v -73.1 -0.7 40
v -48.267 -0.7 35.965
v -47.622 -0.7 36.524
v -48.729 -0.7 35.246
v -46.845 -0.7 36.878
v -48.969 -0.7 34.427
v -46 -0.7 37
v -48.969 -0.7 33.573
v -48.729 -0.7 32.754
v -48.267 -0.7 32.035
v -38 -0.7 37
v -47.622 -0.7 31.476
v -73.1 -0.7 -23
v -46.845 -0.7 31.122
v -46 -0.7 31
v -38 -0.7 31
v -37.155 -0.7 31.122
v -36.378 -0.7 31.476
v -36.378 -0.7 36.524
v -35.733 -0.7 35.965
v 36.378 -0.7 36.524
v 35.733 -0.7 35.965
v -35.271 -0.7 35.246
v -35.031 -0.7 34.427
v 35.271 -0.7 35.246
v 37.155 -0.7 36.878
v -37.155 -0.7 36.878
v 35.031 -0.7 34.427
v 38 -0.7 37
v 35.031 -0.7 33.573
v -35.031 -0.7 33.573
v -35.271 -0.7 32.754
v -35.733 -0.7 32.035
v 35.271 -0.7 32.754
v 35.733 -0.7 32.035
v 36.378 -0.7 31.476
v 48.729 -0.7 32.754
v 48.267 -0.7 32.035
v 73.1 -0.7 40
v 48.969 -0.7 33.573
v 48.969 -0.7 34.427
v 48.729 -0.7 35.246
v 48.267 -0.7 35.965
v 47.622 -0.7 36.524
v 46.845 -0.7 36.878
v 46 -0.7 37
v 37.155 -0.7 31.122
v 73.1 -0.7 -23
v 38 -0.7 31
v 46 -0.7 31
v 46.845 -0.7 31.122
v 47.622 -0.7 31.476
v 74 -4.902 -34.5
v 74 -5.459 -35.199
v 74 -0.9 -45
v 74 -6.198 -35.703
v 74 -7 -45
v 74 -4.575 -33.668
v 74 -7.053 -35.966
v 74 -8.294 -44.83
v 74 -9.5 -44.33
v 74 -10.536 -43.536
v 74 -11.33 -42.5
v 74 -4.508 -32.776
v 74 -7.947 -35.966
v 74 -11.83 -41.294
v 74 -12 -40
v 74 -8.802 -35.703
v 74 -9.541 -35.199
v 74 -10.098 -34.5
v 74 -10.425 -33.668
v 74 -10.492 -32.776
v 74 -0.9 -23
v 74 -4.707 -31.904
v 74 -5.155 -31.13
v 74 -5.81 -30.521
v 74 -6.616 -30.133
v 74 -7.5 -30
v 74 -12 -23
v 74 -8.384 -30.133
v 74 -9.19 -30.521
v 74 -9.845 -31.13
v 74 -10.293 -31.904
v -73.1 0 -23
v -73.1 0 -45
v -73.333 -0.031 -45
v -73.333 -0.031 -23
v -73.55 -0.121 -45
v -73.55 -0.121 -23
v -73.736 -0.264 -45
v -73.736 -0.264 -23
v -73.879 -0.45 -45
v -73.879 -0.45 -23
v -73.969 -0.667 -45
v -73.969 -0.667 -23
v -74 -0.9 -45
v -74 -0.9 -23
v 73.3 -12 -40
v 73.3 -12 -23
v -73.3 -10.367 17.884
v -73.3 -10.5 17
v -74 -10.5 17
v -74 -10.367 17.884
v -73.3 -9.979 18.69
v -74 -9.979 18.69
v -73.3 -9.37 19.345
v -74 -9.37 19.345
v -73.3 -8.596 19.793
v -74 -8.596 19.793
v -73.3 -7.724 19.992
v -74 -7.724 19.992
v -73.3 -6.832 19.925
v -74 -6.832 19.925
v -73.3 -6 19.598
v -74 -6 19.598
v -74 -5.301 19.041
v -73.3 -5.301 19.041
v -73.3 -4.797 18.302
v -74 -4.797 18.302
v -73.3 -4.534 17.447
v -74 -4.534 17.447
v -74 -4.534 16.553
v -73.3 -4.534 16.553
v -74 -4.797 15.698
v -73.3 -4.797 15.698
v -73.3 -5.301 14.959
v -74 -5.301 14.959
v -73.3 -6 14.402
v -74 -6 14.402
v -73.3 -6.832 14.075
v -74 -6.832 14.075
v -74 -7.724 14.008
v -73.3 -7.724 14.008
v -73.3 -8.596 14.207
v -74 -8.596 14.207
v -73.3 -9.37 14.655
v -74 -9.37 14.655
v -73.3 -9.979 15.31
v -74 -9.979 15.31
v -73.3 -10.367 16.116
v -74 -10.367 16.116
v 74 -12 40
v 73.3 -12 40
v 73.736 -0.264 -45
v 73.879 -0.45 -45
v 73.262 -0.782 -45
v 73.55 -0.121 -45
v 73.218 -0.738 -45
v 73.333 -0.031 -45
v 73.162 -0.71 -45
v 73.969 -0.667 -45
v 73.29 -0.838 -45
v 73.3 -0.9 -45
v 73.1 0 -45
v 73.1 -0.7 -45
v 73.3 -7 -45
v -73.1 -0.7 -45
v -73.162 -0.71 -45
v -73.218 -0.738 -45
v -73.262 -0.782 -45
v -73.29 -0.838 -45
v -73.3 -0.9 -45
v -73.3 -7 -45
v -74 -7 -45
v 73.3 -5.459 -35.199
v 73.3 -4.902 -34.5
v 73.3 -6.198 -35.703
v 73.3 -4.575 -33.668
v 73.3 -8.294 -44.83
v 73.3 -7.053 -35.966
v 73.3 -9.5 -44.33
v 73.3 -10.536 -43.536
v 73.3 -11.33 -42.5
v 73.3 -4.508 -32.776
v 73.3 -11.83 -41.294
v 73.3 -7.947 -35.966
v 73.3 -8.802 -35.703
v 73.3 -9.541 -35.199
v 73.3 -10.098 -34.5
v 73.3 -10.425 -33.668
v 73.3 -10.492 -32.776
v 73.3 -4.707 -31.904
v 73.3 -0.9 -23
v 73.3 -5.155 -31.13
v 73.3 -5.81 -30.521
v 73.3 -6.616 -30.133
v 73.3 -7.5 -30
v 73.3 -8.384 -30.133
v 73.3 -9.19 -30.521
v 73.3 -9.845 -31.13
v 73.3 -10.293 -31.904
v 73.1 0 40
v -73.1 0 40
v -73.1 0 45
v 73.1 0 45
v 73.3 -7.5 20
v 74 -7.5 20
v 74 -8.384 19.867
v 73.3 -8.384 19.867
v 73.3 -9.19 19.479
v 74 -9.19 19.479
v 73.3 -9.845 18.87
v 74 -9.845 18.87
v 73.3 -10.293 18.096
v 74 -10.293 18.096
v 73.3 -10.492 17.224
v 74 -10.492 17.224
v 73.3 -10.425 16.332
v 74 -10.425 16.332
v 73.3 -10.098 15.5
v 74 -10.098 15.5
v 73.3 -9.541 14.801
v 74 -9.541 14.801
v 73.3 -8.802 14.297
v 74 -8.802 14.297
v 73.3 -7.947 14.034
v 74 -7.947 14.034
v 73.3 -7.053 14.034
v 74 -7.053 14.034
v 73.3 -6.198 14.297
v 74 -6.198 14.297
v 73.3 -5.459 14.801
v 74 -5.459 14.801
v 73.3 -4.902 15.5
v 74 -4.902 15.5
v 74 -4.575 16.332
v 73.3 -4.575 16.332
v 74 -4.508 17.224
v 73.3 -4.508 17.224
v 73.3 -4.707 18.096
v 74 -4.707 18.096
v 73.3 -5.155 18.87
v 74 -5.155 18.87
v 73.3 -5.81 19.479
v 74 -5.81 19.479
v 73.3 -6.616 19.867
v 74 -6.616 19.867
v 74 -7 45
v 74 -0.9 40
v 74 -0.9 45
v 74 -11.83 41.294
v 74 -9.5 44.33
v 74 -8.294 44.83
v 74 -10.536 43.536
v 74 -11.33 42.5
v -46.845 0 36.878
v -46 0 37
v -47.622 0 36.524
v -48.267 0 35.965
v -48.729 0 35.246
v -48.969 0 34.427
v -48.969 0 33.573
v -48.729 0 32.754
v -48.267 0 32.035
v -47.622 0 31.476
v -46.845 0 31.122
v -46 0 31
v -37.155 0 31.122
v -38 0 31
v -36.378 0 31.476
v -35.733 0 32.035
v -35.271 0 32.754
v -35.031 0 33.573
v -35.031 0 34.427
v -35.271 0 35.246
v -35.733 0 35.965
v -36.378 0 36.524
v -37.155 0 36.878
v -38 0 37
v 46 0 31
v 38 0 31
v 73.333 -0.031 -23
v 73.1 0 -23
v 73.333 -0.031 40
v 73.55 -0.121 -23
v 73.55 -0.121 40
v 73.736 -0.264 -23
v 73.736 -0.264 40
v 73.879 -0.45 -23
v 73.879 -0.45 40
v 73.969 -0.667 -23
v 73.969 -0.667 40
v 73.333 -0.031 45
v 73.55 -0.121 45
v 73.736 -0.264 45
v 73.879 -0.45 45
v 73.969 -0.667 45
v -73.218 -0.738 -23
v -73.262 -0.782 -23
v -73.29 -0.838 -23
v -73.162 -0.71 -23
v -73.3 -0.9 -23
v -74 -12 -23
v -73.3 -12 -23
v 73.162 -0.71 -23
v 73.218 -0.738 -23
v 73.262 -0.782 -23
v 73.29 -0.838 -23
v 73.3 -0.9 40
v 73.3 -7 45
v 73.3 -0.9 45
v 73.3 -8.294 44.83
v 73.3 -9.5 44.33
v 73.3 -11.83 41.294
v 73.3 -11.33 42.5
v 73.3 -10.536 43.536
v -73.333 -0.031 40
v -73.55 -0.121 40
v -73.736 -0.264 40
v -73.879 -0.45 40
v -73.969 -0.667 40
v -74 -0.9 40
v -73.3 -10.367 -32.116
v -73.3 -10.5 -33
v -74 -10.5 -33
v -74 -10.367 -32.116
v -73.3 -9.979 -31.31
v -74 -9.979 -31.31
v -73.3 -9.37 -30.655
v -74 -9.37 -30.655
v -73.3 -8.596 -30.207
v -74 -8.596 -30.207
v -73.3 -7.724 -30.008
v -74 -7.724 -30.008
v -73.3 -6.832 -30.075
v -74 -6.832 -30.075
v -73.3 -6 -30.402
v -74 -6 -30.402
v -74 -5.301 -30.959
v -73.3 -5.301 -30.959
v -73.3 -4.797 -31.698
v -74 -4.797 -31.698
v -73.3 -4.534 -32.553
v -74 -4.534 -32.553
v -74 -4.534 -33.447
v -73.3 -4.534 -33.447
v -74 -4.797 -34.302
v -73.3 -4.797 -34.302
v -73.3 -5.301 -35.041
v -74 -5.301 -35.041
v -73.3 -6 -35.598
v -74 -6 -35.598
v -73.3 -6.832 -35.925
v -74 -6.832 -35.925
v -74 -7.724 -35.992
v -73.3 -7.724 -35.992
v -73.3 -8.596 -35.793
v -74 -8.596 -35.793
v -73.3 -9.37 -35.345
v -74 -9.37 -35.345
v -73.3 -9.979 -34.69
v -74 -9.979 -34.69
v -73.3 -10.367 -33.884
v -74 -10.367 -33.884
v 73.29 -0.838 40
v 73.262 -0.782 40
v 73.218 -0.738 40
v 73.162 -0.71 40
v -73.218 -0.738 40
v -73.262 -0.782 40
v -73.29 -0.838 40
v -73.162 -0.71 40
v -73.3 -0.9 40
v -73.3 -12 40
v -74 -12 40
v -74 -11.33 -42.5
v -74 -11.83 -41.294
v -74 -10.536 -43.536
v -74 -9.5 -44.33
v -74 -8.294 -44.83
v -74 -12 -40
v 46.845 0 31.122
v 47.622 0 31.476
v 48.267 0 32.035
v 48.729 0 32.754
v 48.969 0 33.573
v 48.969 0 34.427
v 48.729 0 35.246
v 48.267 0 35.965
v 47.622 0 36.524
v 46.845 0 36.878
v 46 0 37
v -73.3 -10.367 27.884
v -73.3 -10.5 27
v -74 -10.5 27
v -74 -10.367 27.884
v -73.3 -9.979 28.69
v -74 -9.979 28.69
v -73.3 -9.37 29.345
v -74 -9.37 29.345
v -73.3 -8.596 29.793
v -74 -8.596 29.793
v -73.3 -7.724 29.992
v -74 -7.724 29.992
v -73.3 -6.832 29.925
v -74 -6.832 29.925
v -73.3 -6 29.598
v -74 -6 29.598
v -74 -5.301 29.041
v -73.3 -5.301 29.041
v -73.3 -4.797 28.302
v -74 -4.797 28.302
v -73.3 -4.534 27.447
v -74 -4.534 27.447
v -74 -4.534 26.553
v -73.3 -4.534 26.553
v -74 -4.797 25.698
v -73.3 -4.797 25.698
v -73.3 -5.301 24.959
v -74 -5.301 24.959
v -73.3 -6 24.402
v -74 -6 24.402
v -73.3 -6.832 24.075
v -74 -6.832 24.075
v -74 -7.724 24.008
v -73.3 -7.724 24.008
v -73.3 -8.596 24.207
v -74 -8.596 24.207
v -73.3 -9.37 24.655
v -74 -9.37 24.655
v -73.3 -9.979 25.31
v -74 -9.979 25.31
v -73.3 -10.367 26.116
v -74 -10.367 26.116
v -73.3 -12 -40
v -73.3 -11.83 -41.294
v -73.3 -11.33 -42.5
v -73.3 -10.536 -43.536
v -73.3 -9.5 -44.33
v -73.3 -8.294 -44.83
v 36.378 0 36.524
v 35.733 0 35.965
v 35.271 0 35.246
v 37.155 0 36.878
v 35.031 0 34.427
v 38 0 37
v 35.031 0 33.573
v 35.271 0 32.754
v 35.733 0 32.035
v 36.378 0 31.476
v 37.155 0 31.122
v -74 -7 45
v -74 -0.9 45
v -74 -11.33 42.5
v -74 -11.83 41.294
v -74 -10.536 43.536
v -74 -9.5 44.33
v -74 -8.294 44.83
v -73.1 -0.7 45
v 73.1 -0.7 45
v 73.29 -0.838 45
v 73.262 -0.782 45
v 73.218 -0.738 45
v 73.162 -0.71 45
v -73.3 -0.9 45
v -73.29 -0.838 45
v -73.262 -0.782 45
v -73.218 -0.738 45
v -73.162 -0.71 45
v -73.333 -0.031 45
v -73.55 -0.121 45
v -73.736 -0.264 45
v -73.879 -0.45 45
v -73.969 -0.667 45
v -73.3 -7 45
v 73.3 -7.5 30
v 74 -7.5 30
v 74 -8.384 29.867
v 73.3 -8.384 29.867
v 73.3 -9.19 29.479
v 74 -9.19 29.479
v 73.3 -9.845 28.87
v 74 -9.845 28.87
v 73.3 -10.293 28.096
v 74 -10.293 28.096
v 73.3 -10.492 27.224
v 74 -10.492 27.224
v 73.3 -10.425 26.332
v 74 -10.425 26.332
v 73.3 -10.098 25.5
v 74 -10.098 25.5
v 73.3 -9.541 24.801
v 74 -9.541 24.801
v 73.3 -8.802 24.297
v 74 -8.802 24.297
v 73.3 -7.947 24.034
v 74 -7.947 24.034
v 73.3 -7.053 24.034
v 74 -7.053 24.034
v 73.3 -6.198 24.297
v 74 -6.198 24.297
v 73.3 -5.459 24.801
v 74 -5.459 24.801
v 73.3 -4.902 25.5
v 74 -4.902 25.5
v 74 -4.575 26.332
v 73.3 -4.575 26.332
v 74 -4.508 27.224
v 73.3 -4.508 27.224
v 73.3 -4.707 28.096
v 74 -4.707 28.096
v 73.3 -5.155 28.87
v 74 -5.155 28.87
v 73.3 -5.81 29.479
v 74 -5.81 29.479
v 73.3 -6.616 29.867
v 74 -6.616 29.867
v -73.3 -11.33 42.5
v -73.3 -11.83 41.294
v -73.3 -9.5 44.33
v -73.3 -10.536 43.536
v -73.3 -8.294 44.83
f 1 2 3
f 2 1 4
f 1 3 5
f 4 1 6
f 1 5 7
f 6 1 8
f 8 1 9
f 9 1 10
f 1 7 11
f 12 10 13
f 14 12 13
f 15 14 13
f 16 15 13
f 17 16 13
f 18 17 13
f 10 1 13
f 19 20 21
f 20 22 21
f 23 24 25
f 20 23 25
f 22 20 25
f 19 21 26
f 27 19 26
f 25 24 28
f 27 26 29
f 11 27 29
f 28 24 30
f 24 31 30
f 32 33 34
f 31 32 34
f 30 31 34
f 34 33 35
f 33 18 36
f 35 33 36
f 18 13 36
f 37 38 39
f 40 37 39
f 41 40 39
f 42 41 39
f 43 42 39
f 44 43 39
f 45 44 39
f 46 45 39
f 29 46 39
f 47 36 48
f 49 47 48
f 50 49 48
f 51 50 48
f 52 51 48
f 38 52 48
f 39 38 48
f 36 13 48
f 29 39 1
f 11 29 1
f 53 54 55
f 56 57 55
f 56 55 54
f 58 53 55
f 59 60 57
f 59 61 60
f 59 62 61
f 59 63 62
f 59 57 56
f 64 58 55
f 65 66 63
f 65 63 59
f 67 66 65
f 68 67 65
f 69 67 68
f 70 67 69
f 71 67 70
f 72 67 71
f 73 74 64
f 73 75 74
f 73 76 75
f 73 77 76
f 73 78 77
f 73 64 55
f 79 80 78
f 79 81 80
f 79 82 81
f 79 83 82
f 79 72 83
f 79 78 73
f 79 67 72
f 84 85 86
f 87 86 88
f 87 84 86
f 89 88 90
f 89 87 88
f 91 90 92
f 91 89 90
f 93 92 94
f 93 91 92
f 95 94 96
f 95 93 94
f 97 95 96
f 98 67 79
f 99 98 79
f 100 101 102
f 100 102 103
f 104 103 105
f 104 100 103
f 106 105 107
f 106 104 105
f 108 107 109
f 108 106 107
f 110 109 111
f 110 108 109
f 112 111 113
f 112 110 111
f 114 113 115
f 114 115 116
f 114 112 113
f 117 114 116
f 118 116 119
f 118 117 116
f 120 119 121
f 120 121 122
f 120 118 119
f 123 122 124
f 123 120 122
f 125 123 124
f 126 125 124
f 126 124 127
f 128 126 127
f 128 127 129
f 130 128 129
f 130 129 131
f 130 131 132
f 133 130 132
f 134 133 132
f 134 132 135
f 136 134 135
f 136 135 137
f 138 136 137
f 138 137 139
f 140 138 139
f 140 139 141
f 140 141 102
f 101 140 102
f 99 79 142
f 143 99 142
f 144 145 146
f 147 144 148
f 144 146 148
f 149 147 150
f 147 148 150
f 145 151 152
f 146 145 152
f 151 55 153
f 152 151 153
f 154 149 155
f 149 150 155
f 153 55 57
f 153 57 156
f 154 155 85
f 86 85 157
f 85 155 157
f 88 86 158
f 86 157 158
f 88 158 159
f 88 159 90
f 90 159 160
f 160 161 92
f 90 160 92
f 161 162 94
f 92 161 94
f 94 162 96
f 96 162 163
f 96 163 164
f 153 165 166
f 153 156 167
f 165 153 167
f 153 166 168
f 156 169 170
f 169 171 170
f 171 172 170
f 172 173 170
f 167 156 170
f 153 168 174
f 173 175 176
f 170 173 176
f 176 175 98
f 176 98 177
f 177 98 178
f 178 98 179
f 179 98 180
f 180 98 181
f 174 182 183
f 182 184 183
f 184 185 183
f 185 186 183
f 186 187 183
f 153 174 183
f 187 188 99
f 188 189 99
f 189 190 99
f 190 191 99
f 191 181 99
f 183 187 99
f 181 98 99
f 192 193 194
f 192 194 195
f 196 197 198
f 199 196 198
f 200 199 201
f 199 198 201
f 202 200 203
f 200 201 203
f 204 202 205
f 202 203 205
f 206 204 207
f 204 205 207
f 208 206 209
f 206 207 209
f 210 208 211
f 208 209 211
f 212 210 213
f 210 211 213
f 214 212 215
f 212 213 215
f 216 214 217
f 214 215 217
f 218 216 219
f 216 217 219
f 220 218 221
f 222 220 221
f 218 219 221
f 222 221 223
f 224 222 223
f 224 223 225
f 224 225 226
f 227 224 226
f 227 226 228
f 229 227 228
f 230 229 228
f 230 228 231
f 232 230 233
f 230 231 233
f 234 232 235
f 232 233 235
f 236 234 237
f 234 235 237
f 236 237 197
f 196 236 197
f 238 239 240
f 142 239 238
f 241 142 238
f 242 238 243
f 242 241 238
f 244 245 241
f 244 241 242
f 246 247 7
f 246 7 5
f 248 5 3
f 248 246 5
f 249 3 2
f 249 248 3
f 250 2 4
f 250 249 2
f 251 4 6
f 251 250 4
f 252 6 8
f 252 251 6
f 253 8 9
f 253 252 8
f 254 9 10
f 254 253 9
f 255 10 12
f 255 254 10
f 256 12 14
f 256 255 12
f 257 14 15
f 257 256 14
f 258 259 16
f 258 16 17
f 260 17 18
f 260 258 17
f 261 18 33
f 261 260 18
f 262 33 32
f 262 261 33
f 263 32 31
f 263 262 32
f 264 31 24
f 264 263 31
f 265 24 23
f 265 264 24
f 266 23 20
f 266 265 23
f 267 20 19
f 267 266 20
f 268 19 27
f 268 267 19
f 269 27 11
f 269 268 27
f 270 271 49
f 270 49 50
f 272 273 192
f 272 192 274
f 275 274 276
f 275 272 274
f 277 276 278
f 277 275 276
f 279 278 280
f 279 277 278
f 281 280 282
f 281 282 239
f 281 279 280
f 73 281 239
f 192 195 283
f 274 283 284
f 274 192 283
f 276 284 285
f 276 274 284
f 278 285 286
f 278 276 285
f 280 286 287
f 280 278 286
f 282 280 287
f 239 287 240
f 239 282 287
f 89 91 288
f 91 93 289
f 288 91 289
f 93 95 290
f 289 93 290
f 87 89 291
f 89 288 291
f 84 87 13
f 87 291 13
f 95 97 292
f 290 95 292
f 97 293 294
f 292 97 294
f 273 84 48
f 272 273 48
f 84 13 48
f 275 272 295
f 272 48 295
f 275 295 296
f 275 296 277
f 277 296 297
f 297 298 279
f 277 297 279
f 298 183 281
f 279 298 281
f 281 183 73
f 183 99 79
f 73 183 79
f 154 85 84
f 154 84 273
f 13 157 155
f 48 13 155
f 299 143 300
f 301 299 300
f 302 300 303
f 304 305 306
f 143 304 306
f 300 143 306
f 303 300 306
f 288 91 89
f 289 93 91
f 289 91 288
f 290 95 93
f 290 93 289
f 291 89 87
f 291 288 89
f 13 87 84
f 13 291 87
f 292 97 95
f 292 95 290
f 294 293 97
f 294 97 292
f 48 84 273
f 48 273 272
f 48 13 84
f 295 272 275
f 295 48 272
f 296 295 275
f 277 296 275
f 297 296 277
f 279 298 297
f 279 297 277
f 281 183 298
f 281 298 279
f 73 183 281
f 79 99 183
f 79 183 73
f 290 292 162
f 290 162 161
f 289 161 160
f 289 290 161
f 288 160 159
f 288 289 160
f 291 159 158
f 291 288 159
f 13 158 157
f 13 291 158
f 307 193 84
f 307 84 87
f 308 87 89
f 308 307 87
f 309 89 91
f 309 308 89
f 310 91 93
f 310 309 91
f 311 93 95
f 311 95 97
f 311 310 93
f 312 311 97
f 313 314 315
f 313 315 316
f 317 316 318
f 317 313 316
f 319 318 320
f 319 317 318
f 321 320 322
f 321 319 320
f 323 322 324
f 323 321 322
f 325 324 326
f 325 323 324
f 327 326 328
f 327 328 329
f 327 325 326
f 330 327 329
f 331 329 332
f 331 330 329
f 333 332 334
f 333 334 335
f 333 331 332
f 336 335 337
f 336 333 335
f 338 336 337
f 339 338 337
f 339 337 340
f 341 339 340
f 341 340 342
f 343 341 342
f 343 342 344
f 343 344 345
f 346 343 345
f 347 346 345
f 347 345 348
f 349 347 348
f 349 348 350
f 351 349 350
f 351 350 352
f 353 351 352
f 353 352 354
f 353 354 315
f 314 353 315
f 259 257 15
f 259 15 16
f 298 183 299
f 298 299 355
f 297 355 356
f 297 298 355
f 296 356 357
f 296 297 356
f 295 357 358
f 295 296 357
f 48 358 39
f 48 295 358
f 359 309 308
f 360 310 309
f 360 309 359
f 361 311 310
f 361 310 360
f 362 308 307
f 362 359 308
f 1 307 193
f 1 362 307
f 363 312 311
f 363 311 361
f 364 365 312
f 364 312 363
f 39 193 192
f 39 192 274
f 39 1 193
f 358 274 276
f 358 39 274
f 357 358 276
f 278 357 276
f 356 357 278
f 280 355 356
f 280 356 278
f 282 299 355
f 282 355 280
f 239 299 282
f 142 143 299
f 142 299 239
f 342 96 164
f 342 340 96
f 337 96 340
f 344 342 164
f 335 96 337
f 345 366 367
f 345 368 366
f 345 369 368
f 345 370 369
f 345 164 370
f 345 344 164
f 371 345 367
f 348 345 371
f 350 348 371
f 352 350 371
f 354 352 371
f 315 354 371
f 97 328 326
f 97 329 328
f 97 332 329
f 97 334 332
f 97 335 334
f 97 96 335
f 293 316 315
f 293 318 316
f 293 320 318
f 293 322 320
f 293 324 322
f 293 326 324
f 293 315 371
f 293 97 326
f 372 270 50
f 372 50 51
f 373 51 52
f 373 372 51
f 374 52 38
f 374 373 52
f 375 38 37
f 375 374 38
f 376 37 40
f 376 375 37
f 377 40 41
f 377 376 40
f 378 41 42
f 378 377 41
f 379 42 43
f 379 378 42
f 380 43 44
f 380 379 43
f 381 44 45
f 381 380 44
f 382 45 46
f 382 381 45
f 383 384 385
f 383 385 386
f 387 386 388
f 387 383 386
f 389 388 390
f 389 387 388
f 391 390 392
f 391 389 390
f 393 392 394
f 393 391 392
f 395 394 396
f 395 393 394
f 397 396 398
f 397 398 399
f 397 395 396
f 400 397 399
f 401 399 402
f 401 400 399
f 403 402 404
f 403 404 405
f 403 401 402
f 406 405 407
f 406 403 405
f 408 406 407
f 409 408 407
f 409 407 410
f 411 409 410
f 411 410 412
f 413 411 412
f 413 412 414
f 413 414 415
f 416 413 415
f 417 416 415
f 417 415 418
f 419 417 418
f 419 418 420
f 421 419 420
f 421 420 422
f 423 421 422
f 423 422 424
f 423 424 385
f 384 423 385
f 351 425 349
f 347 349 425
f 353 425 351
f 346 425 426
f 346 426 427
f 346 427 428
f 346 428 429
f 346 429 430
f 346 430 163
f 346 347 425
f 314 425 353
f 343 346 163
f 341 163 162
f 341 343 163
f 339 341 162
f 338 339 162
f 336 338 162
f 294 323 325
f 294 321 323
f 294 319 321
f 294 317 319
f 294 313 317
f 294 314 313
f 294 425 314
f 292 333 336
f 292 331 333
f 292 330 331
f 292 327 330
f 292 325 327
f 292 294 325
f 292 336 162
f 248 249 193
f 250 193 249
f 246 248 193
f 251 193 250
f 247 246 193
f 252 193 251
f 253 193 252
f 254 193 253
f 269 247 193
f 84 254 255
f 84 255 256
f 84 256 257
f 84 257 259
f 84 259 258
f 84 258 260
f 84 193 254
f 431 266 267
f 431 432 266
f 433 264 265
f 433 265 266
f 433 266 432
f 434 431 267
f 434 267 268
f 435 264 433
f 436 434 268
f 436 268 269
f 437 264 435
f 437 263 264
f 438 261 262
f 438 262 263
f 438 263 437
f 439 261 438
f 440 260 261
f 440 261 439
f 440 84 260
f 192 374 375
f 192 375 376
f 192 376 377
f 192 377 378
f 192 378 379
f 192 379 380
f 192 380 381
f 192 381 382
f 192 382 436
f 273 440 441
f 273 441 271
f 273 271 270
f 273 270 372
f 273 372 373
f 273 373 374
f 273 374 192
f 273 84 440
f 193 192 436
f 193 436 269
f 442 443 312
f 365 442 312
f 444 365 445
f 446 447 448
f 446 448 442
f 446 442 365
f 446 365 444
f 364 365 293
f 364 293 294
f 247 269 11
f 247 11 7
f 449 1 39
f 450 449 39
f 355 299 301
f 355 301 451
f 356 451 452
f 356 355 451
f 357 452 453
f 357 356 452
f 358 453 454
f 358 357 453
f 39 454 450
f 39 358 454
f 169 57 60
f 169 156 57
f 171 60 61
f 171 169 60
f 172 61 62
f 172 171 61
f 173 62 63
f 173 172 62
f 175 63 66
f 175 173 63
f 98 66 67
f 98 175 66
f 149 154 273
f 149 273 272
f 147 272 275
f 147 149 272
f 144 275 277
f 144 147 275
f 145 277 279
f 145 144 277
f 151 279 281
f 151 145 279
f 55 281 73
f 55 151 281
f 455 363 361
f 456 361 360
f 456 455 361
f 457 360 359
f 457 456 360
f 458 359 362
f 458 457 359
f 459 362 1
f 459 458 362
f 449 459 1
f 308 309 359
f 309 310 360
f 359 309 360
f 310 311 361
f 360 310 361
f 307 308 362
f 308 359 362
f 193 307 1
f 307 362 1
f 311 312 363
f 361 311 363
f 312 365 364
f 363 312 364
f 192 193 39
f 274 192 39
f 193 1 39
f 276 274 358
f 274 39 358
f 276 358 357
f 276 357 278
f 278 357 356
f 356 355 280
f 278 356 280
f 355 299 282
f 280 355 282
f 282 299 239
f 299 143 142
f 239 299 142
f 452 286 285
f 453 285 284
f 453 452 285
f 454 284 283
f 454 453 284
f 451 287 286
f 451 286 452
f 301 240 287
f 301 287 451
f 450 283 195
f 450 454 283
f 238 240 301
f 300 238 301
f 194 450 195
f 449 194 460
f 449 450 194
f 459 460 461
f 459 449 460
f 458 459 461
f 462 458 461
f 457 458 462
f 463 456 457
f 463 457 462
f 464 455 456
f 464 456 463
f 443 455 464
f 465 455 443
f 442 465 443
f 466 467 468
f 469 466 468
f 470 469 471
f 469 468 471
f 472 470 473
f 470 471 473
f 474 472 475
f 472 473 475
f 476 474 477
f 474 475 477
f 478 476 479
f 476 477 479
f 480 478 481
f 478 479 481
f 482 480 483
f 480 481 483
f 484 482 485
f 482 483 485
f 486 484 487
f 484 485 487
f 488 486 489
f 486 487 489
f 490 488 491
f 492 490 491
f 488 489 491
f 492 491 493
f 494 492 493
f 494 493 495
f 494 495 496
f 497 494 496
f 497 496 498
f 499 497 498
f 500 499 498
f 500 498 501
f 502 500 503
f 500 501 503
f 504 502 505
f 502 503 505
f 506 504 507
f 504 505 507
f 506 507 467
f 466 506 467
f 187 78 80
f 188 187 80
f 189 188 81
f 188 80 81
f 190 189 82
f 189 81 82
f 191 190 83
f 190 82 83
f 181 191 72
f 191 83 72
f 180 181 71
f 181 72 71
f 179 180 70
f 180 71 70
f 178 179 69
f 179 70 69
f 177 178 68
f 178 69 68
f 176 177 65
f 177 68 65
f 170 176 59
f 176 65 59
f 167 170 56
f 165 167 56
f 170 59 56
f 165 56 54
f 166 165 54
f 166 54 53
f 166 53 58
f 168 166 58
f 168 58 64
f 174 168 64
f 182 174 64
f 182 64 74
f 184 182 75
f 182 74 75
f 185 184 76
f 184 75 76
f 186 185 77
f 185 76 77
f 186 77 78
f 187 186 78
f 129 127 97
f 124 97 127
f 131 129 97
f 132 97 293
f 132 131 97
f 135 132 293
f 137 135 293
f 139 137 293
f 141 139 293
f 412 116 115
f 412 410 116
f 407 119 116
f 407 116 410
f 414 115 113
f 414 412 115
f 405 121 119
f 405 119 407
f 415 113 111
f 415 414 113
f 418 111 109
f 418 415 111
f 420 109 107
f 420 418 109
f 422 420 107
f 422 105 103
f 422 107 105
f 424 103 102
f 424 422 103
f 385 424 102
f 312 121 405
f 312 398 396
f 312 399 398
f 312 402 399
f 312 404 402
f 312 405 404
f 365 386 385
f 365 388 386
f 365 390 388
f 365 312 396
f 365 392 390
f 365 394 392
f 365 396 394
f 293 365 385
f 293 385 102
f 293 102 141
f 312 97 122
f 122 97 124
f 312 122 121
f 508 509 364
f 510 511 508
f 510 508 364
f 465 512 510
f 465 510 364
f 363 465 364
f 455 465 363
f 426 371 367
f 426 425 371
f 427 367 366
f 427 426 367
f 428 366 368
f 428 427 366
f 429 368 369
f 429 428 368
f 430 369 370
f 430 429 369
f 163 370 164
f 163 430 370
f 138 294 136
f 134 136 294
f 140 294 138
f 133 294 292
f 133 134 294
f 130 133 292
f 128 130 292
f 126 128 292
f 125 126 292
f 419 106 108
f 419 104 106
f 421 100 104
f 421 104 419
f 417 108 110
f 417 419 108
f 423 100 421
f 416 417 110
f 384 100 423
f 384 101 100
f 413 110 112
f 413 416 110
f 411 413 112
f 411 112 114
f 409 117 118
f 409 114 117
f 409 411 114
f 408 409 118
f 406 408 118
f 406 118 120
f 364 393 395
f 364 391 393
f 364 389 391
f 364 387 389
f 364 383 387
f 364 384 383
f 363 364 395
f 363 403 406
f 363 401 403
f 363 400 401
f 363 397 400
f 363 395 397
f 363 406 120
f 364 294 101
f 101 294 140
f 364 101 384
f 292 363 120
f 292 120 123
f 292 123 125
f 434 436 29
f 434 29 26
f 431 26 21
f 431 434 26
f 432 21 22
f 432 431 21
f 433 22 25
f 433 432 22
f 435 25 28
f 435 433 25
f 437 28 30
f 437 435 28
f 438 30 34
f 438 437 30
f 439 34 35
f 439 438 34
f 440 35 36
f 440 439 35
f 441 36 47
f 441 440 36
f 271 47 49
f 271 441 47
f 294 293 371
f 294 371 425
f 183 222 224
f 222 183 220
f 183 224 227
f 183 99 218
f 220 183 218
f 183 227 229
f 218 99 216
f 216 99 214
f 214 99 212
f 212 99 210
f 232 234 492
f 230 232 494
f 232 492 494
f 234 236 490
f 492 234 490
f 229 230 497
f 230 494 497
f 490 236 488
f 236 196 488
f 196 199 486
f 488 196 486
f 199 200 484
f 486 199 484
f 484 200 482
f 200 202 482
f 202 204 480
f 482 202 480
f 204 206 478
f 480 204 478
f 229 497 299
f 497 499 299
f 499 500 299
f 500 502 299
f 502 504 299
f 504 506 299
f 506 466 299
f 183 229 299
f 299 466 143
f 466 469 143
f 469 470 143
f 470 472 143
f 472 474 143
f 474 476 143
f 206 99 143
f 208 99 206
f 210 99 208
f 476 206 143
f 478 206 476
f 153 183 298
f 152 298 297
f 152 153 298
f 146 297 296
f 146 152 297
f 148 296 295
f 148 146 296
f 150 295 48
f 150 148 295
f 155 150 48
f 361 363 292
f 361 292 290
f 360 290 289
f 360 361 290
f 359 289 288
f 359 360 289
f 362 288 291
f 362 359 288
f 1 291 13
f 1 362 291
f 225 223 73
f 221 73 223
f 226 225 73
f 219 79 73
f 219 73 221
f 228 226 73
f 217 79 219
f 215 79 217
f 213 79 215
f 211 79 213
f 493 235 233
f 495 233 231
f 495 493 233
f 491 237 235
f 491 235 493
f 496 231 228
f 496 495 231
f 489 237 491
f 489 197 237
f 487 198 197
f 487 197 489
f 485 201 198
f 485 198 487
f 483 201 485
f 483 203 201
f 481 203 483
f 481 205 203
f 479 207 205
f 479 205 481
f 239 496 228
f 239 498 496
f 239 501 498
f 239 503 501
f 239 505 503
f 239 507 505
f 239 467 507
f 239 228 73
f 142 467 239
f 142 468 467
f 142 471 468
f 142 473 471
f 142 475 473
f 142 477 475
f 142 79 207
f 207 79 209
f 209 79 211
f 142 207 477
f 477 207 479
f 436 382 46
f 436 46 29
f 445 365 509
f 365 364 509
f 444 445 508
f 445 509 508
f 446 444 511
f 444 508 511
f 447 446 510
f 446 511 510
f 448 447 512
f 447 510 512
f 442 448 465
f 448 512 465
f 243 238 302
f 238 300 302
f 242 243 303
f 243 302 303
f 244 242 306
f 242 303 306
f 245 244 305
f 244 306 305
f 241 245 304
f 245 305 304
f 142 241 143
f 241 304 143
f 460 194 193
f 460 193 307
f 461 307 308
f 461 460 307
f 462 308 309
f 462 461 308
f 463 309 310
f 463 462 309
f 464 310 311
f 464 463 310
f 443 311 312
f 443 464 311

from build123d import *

# Parameters (mm, degrees)
SKETCH_1_W                         = 148
SKETCH_1_H                         = 90
SM_BASE_FLANGE_1_DEPTH             = 0.7
SM_EDGE_FLANGE_1_STRIP_W           = 3.2
SM_EDGE_FLANGE_1_STRIP_H           = 0.7
SM_EDGE_FLANGE_1_STRIP_CUT_DEPTH   = 90
SM_EDGE_FLANGE_1_STRIP_2_W         = 3.2
SM_EDGE_FLANGE_1_STRIP_2_H         = 0.7
SM_EDGE_FLANGE_1_STRIP_CUT_2_DEPTH = 90
SM_EDGE_FLANGE_1_DEPTH             = 90
SM_EDGE_FLANGE_1_PROFILE_W         = 90
SM_EDGE_FLANGE_1_PROFILE_H         = 11.1
SM_EDGE_FLANGE_1_PROFILE_R         = 3
SM_EDGE_FLANGE_1_FLAT_DEPTH        = 0.7
SM_EDGE_FLANGE_1_BEND_DEPTH        = 90
FILLET_2_R                         = 5
CUT_EXTRUDE_START                  = -10
SKETCH_15_R                        = 3
CUT_EXTRUDE_1_DEPTH                = 10
SPLIT_BODIES_1_SURFACE_1_1_BACK    = 174.632
SPLIT_BODIES_1_SURFACE_1_1_DEPTH   = 349.264
SPLIT_BODIES_1_SURFACE_1_2_BACK    = 174.632
SPLIT_BODIES_1_SURFACE_1_2_DEPTH   = 349.264
SPLIT_BODIES_1_SURFACE_2_3_BACK    = 174.632
SPLIT_BODIES_1_SURFACE_2_3_DEPTH   = 349.264
SPLIT_BODIES_1_SURFACE_2_4_BACK    = 174.632
SPLIT_BODIES_1_SURFACE_2_4_DEPTH   = 349.264


# Sheet-metal steps are written as plain solids
with BuildPart() as part:
    # Sketch 1 → 基体-法兰1 (new body)
    with BuildSketch(Plane(origin=(0, 0, 0), x_dir=(1, 0, 0), z_dir=(0, 1, 0))):
        Rectangle(SKETCH_1_W, SKETCH_1_H)
        with BuildLine():
            Line((-46, -31), (-38, -31))
            ThreePointArc((-38, -31), (-35, -34), (-38, -37))
            Line((-38, -37), (-46, -37))
            ThreePointArc((-46, -37), (-49, -34), (-46, -31))
        make_face(mode=Mode.SUBTRACT)
        with BuildLine():
            Line((38, -31), (46, -31))
            ThreePointArc((46, -31), (49, -34), (46, -37))
            Line((46, -37), (38, -37))
            ThreePointArc((38, -37), (35, -34), (38, -31))
        make_face(mode=Mode.SUBTRACT)
    extrude(amount=-SM_BASE_FLANGE_1_DEPTH)

    # 边线-法兰1 strip (across the edge) → 边线-法兰1 strip cut (cut)
    with BuildSketch(Plane(origin=(74, -0.7, -45), x_dir=(-1, 0, 0), z_dir=(0, 0, 1))):
        with Locations((-0.7, -0.35)):
            Rectangle(SM_EDGE_FLANGE_1_STRIP_W, SM_EDGE_FLANGE_1_STRIP_H)
    extrude(amount=SM_EDGE_FLANGE_1_STRIP_CUT_DEPTH, mode=Mode.SUBTRACT)

    # 边线-法兰1 strip 2 (across the edge) → 边线-法兰1 strip cut 2 (cut)
    with BuildSketch(Plane(origin=(-74, -0.7, 45), x_dir=(1, 0, 0), z_dir=(0, 0, -1))):
        with Locations((-0.7, -0.35)):
            Rectangle(SM_EDGE_FLANGE_1_STRIP_2_W, SM_EDGE_FLANGE_1_STRIP_2_H)
    extrude(amount=SM_EDGE_FLANGE_1_STRIP_CUT_2_DEPTH, mode=Mode.SUBTRACT)

    # 边线-法兰1 bend section (across the edge) → 边线-法兰1 (add)
    with BuildSketch(Plane(origin=(74, -0.7, -45), x_dir=(-1, 0, 0), z_dir=(0, 0, 1))):
        with BuildLine():
            Line((0, 0.2), (0.7, 0.2))
            ThreePointArc((0.7, 0.2), (0.758578644, 0.058578644), (0.9, 0))
            Line((0.9, 0), (0.9, -0.7))
            ThreePointArc((0.9, -0.7), (0.263603897, -0.436396103), (0, 0.2))
        make_face()
    extrude(amount=SM_EDGE_FLANGE_1_DEPTH)

    # 边线-法兰1 profile (on flange) → 边线-法兰1 flat (add)
    with BuildSketch(Plane(origin=(74, -0.7, 0), x_dir=(0, 0, 1), z_dir=(1, 0, 0))):
        with Locations((0, 5.75)):
            Rectangle(SM_EDGE_FLANGE_1_PROFILE_W, SM_EDGE_FLANGE_1_PROFILE_H)
        with Locations((17, 6.8)):
            Circle(SM_EDGE_FLANGE_1_PROFILE_R, mode=Mode.SUBTRACT)
        with Locations((27, 6.8)):
            Circle(SM_EDGE_FLANGE_1_PROFILE_R, mode=Mode.SUBTRACT)
        with Locations((-33, 6.8)):
            Circle(SM_EDGE_FLANGE_1_PROFILE_R, mode=Mode.SUBTRACT)
    extrude(amount=-SM_EDGE_FLANGE_1_FLAT_DEPTH)

    # 边线-法兰1 section (across the edge) → 边线-法兰1 bend (add)
    with BuildSketch(Plane(origin=(-74, -0.7, 45), x_dir=(1, 0, 0), z_dir=(0, 0, -1))):
        with BuildLine():
            Line((0, 0.2), (0, 11.3))
            Line((0, 11.3), (0.7, 11.3))
            Line((0.7, 11.3), (0.7, 0.2))
            ThreePointArc((0.7, 0.2), (0.758578644, 0.058578644), (0.9, 0))
            Line((0.9, 0), (0.9, -0.7))
            ThreePointArc((0.9, -0.7), (0.263603897, -0.436396103), (0, 0.2))
        make_face()
    extrude(amount=SM_EDGE_FLANGE_1_BEND_DEPTH)

    # 圆角2
    fillet_2_edges = [part.edges().sort_by_distance(p)[0] for p in [
        (-73.65, -12, 45),
        (-73.65, -12, -45),
        (73.65, -12, -45),
        (73.65, -12, 45),
    ]]
    fillet(fillet_2_edges, radius=FILLET_2_R)

    # 草图15 → 切除-拉伸1 (cut)
    with BuildSketch(Plane.ZY.offset(74).offset(CUT_EXTRUDE_START)):
        with Locations(Location((-33, -7.5, 0), (0, 0, 270))):
            Circle(SKETCH_15_R)
        with Locations(Location((17, -7.5, 0), (0, 0, 270))):
            Circle(SKETCH_15_R)
        with Locations(Location((27, -7.5, 0), (0, 0, 270))):
            Circle(SKETCH_15_R)
    extrude(amount=CUT_EXTRUDE_1_DEPTH, mode=Mode.SUBTRACT)


with BuildPart() as body_2:
    # Split Bodies 1: the piece behind the surface
    add(part.part)
    # Split Bodies 1 surface 1: a surface, the sketch's curves swept straight by 349.264 mm
    with BuildLine(Plane(origin=(0, 0, 0), x_dir=(1, 0, 0), z_dir=(0, 1, 0)).offset(-SPLIT_BODIES_1_SURFACE_1_1_BACK), mode=Mode.PRIVATE) as split_bodies_1_surface_1_1_path:
        Line((-74, 23), (74, 23))
    split_bodies_1_surface_1_1 = Shell.extrude(split_bodies_1_surface_1_1_path.wire(), (0 * SPLIT_BODIES_1_SURFACE_1_1_DEPTH, 1 * SPLIT_BODIES_1_SURFACE_1_1_DEPTH, 0 * SPLIT_BODIES_1_SURFACE_1_1_DEPTH))
    split(bisect_by=split_bodies_1_surface_1_1, keep=Keep.BOTTOM)


with BuildPart() as part_1:
    add(part.part)

    # Split Bodies 1: split by a surface, the side it looks to stays
    # Split Bodies 1 surface 1: a surface, the sketch's curves swept straight by 349.264 mm
    with BuildLine(Plane(origin=(0, 0, 0), x_dir=(1, 0, 0), z_dir=(0, 1, 0)).offset(-SPLIT_BODIES_1_SURFACE_1_2_BACK), mode=Mode.PRIVATE) as split_bodies_1_surface_1_2_path:
        Line((-74, 23), (74, 23))
    split_bodies_1_surface_1_2 = Shell.extrude(split_bodies_1_surface_1_2_path.wire(), (0 * SPLIT_BODIES_1_SURFACE_1_2_DEPTH, 1 * SPLIT_BODIES_1_SURFACE_1_2_DEPTH, 0 * SPLIT_BODIES_1_SURFACE_1_2_DEPTH))
    split(bisect_by=split_bodies_1_surface_1_2, keep=Keep.TOP)


with BuildPart() as body_3:
    # Split Bodies 1 2 body 2: the piece behind the surface
    add(body_2.part)
    # Split Bodies 1 surface 2: a surface, the sketch's curves swept straight by 349.264 mm
    with BuildLine(Plane(origin=(0, 0, 0), x_dir=(1, 0, 0), z_dir=(0, 1, 0)).offset(-SPLIT_BODIES_1_SURFACE_2_3_BACK), mode=Mode.PRIVATE) as split_bodies_1_surface_2_3_path:
        Line((-74, -40), (74, -40))
    split_bodies_1_surface_2_3 = Shell.extrude(split_bodies_1_surface_2_3_path.wire(), (0 * SPLIT_BODIES_1_SURFACE_2_3_DEPTH, 1 * SPLIT_BODIES_1_SURFACE_2_3_DEPTH, 0 * SPLIT_BODIES_1_SURFACE_2_3_DEPTH))
    split(bisect_by=split_bodies_1_surface_2_3, keep=Keep.BOTTOM)


with BuildPart() as body_2_1:
    add(body_2.part)

    # Split Bodies 1 2 body 2: split by a surface, the side it looks to stays
    # Split Bodies 1 surface 2: a surface, the sketch's curves swept straight by 349.264 mm
    with BuildLine(Plane(origin=(0, 0, 0), x_dir=(1, 0, 0), z_dir=(0, 1, 0)).offset(-SPLIT_BODIES_1_SURFACE_2_4_BACK), mode=Mode.PRIVATE) as split_bodies_1_surface_2_4_path:
        Line((-74, -40), (74, -40))
    split_bodies_1_surface_2_4 = Shell.extrude(split_bodies_1_surface_2_4_path.wire(), (0 * SPLIT_BODIES_1_SURFACE_2_4_DEPTH, 1 * SPLIT_BODIES_1_SURFACE_2_4_DEPTH, 0 * SPLIT_BODIES_1_SURFACE_2_4_DEPTH))
    split(bisect_by=split_bodies_1_surface_2_4, keep=Keep.TOP)


solid = Compound([part_1.part, body_3.part, body_2_1.part])
